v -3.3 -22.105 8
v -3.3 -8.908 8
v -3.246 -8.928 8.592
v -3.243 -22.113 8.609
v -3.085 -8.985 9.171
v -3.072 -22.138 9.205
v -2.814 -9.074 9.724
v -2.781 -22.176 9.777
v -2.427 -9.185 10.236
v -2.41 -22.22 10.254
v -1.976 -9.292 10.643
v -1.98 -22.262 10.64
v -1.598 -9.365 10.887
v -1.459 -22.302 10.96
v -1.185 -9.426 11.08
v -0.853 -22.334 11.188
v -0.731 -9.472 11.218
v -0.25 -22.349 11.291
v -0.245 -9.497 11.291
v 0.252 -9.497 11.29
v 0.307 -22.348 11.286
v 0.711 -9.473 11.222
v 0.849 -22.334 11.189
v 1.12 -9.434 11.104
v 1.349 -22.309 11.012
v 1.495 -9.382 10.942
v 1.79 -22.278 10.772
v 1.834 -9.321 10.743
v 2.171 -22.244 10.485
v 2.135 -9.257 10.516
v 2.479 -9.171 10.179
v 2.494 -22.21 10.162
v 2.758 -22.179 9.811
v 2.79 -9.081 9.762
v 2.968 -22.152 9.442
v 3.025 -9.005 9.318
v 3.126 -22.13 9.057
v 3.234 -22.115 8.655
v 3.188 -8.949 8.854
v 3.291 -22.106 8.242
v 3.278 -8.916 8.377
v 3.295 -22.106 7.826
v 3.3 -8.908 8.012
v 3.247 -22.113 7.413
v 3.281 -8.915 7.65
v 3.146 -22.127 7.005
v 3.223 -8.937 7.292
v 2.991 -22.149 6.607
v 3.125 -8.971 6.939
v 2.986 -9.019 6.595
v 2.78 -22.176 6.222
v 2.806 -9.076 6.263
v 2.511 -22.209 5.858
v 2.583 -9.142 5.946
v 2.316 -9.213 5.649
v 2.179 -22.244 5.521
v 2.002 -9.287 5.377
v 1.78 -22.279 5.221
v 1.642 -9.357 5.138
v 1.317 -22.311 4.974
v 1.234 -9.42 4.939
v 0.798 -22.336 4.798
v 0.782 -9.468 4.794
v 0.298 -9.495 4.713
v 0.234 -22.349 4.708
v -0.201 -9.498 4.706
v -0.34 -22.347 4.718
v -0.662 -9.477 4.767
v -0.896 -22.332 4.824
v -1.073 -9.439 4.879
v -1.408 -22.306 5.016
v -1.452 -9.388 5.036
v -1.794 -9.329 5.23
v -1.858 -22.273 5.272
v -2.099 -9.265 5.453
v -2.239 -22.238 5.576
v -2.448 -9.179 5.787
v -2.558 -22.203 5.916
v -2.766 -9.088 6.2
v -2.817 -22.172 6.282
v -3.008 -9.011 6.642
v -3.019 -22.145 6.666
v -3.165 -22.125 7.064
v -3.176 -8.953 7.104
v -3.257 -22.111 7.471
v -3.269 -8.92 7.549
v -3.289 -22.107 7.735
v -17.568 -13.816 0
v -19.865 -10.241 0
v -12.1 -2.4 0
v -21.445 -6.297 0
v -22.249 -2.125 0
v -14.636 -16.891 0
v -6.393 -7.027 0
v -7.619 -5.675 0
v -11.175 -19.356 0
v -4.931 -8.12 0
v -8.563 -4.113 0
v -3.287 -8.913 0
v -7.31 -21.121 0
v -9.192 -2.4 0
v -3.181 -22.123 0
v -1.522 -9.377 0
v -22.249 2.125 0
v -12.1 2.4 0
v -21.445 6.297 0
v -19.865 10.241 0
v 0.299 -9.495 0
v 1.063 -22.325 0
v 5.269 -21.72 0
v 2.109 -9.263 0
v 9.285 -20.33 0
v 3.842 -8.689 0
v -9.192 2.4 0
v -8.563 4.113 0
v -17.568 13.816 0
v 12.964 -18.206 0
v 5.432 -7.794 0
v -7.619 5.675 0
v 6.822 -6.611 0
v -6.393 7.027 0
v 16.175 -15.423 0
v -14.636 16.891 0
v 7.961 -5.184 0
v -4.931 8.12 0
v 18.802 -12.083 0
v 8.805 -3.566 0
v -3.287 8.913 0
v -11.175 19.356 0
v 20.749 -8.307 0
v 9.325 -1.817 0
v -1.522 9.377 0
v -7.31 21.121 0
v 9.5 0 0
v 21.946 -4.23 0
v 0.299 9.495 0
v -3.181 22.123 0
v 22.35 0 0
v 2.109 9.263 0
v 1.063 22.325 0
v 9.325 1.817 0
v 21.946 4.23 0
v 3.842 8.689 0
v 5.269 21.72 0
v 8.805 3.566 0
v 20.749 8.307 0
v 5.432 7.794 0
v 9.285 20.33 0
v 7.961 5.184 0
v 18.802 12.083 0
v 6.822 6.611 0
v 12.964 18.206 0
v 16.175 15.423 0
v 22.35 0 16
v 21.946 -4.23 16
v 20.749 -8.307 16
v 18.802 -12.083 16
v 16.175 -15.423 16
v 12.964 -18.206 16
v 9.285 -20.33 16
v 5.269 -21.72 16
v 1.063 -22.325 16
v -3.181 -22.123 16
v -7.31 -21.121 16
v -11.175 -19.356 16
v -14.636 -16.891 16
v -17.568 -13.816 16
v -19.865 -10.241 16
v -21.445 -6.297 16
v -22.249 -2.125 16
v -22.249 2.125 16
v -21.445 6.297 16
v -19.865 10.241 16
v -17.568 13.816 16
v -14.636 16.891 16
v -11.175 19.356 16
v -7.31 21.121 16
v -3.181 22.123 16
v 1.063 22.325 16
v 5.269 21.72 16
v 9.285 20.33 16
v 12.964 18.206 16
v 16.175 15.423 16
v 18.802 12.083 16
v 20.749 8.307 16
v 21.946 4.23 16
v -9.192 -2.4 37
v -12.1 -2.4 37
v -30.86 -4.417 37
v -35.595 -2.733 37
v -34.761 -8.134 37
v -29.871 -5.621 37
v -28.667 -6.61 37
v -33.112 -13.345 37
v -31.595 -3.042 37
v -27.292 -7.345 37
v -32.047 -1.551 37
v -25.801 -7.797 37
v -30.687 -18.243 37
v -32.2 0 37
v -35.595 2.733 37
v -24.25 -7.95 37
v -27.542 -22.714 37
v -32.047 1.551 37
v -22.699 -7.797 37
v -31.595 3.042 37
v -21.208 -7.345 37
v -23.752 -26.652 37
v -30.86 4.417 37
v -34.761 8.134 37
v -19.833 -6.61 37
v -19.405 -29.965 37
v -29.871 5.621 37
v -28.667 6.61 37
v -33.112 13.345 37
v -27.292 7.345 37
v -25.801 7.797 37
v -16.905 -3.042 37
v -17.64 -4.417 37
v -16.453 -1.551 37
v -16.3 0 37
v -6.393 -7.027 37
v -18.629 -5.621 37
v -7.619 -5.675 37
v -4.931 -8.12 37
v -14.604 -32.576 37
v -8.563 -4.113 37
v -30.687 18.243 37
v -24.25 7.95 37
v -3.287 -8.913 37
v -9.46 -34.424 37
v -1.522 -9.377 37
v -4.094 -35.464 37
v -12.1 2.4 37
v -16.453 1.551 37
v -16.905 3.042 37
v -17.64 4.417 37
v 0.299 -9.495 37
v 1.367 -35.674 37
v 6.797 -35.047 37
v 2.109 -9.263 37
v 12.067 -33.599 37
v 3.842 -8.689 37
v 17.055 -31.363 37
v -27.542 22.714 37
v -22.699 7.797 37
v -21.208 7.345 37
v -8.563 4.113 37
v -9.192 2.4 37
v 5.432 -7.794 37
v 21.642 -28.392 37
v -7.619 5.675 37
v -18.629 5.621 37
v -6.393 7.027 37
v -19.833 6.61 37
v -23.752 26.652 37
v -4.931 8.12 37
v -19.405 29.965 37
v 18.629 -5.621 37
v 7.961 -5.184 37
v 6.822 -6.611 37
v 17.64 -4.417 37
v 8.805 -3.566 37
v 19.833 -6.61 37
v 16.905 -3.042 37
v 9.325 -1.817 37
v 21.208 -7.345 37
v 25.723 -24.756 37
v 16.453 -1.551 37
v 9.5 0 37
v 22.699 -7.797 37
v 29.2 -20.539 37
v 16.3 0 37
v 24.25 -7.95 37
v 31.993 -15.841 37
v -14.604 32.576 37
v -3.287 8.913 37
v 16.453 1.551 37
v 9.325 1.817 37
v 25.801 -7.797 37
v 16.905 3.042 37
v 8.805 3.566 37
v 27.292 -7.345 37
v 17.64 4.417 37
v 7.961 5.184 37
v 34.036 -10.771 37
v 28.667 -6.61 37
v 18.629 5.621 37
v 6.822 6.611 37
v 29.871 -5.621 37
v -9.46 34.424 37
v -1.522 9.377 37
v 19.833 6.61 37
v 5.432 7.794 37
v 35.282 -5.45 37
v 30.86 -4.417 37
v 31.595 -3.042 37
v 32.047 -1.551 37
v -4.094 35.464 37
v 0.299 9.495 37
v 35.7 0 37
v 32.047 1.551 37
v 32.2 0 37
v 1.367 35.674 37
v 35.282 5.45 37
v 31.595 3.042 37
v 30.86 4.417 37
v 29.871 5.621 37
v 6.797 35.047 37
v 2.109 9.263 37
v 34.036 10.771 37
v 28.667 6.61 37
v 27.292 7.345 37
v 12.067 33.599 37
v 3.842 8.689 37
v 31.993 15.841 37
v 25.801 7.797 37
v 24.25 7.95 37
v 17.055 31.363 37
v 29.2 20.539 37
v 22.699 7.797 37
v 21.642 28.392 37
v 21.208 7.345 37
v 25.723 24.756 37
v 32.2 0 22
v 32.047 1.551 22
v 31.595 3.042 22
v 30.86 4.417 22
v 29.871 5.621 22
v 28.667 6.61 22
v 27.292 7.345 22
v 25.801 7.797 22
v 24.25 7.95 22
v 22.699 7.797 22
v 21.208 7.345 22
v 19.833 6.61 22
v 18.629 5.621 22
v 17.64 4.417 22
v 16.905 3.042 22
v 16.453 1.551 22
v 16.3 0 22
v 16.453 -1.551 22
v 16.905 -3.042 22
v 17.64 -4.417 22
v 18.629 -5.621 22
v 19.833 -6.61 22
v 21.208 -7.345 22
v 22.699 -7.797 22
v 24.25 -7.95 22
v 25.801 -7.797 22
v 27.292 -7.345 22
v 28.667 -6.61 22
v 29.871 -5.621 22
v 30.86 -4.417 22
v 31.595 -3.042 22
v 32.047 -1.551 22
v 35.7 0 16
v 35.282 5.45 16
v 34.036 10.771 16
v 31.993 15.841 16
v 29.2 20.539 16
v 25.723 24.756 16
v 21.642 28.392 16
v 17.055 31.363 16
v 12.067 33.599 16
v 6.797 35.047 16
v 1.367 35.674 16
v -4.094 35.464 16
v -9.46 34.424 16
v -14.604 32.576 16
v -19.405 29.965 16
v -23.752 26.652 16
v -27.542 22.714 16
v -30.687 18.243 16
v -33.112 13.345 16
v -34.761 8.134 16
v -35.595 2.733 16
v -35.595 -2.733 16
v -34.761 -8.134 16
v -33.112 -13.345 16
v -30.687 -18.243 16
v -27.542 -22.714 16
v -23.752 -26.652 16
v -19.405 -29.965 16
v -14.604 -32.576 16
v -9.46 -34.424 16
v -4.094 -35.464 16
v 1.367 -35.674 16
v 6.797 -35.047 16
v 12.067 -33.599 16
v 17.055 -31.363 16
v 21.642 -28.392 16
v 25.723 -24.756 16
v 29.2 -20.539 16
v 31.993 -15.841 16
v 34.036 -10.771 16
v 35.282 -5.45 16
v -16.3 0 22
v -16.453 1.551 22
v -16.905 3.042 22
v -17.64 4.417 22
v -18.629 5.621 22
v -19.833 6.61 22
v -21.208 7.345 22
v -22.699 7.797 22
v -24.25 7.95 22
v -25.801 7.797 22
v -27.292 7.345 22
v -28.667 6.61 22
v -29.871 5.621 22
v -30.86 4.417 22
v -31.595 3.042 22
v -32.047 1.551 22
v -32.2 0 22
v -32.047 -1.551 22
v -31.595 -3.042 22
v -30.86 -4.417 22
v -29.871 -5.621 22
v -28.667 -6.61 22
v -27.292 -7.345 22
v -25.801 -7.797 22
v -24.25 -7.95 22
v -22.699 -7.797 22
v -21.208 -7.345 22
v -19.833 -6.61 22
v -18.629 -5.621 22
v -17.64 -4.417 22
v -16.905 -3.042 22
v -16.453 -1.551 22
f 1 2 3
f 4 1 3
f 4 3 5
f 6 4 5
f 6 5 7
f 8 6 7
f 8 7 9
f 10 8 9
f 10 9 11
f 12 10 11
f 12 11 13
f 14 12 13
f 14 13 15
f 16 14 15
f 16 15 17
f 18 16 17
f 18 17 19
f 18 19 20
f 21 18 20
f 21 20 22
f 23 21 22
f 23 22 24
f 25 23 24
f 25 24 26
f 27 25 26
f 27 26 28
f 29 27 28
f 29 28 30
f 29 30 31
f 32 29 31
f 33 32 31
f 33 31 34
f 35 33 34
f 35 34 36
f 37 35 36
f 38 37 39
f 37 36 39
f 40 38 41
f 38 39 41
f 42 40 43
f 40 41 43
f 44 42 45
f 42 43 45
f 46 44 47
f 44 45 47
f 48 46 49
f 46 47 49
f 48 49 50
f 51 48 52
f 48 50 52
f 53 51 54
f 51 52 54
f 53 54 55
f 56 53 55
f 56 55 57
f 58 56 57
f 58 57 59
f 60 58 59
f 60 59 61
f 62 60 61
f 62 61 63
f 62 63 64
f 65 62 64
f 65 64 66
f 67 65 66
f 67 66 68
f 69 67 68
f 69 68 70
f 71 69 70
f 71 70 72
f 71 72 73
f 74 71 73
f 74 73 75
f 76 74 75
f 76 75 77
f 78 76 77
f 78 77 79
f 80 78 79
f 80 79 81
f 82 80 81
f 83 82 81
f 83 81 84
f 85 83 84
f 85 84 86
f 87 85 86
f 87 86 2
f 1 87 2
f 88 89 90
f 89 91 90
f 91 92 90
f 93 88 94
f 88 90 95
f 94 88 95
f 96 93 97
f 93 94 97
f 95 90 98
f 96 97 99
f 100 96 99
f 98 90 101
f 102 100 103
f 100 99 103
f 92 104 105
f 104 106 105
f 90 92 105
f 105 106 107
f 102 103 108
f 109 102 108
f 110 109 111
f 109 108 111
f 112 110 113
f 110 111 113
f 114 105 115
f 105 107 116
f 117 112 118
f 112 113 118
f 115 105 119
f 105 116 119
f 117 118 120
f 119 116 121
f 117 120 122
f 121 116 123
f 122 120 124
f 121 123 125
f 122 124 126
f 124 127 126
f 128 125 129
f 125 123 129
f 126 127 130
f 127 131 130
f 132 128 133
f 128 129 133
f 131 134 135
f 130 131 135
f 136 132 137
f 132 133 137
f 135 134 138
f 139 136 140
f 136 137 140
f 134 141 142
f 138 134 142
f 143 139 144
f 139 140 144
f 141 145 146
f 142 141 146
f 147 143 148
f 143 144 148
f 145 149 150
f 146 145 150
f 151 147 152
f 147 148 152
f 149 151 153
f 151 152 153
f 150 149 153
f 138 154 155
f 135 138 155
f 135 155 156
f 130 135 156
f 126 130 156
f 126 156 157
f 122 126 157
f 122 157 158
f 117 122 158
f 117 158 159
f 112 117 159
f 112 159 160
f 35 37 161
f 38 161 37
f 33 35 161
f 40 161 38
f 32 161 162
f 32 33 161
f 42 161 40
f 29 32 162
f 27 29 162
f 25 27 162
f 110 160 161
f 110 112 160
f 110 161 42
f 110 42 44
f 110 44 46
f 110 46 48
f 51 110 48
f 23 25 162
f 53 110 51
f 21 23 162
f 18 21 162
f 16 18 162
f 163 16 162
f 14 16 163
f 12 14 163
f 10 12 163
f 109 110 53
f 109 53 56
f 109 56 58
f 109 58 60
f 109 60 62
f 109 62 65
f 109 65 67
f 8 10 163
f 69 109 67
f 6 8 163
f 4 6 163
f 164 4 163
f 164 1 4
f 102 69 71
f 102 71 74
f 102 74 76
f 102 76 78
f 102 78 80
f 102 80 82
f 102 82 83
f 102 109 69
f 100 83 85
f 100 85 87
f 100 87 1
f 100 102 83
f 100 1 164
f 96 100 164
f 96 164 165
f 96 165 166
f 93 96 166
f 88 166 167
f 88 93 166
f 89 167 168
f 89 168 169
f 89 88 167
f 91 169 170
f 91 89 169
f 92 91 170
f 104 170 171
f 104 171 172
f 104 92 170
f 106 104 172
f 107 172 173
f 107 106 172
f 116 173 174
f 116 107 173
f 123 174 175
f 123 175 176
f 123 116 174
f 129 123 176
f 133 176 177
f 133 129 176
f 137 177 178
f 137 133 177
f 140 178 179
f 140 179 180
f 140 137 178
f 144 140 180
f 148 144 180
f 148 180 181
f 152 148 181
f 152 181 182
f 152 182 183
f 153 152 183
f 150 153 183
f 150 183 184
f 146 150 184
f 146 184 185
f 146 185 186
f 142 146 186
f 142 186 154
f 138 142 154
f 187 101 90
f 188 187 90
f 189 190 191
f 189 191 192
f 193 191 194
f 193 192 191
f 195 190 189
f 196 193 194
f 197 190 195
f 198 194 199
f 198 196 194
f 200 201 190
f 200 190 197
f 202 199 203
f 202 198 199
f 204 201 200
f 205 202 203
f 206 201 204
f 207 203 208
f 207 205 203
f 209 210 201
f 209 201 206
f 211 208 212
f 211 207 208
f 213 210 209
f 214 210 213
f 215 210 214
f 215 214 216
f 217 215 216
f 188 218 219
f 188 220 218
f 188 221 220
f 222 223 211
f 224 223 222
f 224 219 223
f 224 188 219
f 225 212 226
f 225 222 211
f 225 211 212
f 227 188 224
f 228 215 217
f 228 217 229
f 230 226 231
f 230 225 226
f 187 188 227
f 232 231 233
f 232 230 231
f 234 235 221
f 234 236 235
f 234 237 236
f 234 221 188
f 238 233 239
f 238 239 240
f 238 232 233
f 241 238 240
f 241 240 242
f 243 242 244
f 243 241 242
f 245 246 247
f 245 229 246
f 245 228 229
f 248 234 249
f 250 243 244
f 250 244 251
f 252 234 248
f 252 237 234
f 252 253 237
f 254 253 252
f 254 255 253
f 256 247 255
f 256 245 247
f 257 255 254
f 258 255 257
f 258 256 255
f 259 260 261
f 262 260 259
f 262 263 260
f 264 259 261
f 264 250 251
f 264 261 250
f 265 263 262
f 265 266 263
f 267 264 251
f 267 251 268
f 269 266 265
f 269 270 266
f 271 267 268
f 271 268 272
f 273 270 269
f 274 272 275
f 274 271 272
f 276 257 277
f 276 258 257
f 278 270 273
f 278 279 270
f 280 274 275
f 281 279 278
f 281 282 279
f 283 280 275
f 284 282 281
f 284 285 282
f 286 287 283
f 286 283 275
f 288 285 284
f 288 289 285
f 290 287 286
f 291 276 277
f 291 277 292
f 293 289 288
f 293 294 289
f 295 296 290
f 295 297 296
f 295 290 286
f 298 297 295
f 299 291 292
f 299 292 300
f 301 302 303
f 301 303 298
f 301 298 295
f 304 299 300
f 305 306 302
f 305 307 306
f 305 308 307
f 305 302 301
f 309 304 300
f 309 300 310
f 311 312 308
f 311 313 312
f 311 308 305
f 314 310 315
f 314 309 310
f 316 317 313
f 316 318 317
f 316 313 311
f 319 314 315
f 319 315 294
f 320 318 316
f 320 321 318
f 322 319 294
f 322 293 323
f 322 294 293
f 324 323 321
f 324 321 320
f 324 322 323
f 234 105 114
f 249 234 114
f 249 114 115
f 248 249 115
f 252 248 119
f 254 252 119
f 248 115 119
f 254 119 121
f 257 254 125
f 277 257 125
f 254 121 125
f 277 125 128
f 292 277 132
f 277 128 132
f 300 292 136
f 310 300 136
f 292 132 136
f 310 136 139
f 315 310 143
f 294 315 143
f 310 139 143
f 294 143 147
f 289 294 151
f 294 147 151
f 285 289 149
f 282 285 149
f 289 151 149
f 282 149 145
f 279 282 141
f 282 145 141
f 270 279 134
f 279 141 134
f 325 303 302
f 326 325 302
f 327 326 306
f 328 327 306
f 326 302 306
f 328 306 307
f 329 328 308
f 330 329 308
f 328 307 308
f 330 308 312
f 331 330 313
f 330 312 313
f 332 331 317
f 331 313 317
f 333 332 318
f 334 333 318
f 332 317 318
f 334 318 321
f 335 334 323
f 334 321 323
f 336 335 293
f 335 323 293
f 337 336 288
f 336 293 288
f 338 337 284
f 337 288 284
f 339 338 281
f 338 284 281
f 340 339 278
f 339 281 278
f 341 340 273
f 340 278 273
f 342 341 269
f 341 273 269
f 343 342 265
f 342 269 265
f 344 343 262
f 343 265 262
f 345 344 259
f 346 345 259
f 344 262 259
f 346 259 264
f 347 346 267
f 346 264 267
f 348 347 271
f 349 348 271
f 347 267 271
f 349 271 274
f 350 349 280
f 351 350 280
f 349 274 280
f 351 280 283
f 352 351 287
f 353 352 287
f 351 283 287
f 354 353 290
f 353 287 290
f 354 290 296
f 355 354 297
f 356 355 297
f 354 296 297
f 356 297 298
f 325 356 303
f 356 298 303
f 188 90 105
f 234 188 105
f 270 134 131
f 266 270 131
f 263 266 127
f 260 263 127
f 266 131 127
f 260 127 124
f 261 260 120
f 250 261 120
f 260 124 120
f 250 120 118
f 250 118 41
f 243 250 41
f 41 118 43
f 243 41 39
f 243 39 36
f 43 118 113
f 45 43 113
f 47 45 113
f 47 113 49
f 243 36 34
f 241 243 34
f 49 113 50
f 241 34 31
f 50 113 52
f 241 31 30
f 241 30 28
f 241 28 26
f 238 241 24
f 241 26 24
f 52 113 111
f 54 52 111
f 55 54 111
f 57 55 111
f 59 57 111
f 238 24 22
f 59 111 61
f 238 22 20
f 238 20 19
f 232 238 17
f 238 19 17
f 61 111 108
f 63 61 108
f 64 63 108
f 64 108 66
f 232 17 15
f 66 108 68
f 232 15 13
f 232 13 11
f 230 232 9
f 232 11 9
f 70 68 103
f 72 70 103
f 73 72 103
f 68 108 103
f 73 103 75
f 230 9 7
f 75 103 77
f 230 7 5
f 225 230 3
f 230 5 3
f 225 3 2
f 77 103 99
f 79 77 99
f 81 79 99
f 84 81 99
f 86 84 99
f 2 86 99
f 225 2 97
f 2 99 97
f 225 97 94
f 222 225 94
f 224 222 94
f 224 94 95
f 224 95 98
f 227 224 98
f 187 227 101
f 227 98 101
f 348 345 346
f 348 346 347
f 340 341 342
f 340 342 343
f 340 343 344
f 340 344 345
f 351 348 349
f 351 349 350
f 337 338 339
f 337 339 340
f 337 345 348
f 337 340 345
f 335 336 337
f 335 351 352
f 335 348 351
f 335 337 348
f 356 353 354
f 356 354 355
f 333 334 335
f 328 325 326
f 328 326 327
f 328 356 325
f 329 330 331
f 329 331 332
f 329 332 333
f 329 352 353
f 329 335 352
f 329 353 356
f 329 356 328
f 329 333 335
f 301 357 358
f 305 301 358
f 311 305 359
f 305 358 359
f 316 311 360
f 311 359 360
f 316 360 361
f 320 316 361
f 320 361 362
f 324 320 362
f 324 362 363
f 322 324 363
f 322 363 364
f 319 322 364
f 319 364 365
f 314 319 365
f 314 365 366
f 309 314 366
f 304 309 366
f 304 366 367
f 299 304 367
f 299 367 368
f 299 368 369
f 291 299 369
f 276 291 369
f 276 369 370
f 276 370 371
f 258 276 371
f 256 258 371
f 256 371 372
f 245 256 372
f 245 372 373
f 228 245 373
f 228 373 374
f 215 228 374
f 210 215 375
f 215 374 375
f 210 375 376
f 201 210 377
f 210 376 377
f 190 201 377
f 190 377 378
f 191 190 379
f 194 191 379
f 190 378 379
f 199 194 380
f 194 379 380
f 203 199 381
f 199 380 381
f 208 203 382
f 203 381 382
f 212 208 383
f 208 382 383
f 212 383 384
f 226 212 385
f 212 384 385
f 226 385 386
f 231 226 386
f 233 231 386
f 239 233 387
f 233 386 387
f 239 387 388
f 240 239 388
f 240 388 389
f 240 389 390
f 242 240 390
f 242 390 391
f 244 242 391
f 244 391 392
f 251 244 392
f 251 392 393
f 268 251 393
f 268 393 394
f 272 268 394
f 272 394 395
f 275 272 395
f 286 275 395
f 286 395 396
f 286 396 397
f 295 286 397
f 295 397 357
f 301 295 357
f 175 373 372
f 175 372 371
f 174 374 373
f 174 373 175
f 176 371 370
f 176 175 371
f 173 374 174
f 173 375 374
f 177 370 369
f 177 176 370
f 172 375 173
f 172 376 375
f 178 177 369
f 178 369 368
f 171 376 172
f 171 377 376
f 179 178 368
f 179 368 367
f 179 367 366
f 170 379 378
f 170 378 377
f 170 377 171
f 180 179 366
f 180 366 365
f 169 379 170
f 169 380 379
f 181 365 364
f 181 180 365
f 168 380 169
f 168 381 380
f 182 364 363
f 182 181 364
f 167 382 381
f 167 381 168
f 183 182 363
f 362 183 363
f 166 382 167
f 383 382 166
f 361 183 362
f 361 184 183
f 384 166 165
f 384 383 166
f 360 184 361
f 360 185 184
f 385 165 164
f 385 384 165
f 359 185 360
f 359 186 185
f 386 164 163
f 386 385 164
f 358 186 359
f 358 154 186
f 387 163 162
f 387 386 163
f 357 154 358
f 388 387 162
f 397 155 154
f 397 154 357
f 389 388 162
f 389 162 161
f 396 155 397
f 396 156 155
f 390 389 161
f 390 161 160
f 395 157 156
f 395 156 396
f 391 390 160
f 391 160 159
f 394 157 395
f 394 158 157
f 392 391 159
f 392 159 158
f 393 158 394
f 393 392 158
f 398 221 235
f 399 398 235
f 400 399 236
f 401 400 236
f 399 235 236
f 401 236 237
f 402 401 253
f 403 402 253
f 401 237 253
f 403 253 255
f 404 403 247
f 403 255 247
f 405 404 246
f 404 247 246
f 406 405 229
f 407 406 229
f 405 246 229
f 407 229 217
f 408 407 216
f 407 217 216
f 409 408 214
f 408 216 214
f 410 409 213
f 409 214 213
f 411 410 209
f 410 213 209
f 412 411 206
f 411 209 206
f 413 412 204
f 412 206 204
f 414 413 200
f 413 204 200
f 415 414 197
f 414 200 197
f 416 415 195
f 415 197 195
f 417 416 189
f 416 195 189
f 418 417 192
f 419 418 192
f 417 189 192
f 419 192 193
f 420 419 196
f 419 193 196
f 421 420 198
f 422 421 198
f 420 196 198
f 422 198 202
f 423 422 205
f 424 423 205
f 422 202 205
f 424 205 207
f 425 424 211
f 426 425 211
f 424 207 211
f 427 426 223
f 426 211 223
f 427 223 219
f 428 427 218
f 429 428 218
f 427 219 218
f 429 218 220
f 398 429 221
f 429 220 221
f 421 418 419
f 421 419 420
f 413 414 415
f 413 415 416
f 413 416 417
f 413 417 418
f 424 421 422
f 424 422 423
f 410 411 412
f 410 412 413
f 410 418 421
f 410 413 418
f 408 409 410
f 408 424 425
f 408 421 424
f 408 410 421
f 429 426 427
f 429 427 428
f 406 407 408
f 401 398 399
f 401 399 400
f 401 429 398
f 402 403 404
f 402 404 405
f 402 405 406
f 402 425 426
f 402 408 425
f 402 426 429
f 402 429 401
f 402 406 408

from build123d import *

# Parameters (mm, degrees)
F0_R      = 35.7
F1_DEPTH  = 37
F3_R      = 35.7
F3_R_2    = 22.35
F4_DEPTH  = 16
F6_DEPTH  = 37.001
F7_R      = 7.95
F8_DEPTH  = 15
F12_D     = 6.6
F12_DEPTH = 35.7
F12_TIP   = 1.9828400428


with BuildPart() as f1:
    # F0 (on Top) → F1 (new body)
    with BuildSketch(Plane.XY):
        Circle(F0_R)
    extrude(amount=F1_DEPTH)

    # F3 (on face) → F4 (cut)
    with BuildSketch(Plane(origin=(0, 0, 0), x_dir=(1, 0, 0), z_dir=(0, 0, -1))):
        Circle(F3_R)
        Circle(F3_R_2, mode=Mode.SUBTRACT)
    extrude(amount=-F4_DEPTH, mode=Mode.SUBTRACT)

    # F5 (on face) → F6 (cut, through all)
    with BuildSketch(Plane(origin=(0, 0, 0), x_dir=(1, 0, 0), z_dir=(0, 0, -1))):
        with BuildLine():
            ThreePointArc((-9.191844211, -2.4), (-9.5, 0), (-9.191844211, 2.4))
            Line((-9.191844211, 2.4), (-12.1, 2.4))
            Line((-12.1, 2.4), (-12.1, -2.4))
            Line((-12.1, -2.4), (-9.191844211, -2.4))
        make_face()
        with BuildLine():
            Line((0, 2.4), (-9.191844211, 2.4))
            ThreePointArc((-9.191844211, 2.4), (-9.5, 0), (-9.191844211, -2.4))
            Line((-9.191844211, -2.4), (0, -2.4))
            Line((0, -2.4), (0, 2.4))
        make_face()
        with BuildLine():
            ThreePointArc((-9.191844211, -2.4), (1.2098512295, -9.4226461253), (9.5, 0))
            ThreePointArc((9.5, 0), (1.2098512295, 9.4226461253), (-9.191844211, 2.4))
            Line((-9.191844211, 2.4), (0, 2.4))
            Line((0, 2.4), (0, -2.4))
            Line((0, -2.4), (-9.191844211, -2.4))
        make_face()
    extrude(amount=-F6_DEPTH, mode=Mode.SUBTRACT)

    # F7 (on face) → F8 (cut)
    with BuildSketch(Plane.XY.offset(37)):
        with Locations((-24.25, 0)):
            Circle(F7_R)
        with Locations((24.25, 0)):
            Circle(F7_R)
    extrude(amount=-F8_DEPTH, mode=Mode.SUBTRACT)

    # F12
    with Locations(Plane.XZ.offset(35.7)):
        with Locations((0, 8)):
            Hole(F12_D / 2, depth=F12_DEPTH)
            with Locations((0, 0, -(F12_DEPTH + F12_TIP / 2))):  # 118° drill point
                Cone(0, F12_D / 2, F12_TIP, mode=Mode.SUBTRACT)


solid = f1.part
